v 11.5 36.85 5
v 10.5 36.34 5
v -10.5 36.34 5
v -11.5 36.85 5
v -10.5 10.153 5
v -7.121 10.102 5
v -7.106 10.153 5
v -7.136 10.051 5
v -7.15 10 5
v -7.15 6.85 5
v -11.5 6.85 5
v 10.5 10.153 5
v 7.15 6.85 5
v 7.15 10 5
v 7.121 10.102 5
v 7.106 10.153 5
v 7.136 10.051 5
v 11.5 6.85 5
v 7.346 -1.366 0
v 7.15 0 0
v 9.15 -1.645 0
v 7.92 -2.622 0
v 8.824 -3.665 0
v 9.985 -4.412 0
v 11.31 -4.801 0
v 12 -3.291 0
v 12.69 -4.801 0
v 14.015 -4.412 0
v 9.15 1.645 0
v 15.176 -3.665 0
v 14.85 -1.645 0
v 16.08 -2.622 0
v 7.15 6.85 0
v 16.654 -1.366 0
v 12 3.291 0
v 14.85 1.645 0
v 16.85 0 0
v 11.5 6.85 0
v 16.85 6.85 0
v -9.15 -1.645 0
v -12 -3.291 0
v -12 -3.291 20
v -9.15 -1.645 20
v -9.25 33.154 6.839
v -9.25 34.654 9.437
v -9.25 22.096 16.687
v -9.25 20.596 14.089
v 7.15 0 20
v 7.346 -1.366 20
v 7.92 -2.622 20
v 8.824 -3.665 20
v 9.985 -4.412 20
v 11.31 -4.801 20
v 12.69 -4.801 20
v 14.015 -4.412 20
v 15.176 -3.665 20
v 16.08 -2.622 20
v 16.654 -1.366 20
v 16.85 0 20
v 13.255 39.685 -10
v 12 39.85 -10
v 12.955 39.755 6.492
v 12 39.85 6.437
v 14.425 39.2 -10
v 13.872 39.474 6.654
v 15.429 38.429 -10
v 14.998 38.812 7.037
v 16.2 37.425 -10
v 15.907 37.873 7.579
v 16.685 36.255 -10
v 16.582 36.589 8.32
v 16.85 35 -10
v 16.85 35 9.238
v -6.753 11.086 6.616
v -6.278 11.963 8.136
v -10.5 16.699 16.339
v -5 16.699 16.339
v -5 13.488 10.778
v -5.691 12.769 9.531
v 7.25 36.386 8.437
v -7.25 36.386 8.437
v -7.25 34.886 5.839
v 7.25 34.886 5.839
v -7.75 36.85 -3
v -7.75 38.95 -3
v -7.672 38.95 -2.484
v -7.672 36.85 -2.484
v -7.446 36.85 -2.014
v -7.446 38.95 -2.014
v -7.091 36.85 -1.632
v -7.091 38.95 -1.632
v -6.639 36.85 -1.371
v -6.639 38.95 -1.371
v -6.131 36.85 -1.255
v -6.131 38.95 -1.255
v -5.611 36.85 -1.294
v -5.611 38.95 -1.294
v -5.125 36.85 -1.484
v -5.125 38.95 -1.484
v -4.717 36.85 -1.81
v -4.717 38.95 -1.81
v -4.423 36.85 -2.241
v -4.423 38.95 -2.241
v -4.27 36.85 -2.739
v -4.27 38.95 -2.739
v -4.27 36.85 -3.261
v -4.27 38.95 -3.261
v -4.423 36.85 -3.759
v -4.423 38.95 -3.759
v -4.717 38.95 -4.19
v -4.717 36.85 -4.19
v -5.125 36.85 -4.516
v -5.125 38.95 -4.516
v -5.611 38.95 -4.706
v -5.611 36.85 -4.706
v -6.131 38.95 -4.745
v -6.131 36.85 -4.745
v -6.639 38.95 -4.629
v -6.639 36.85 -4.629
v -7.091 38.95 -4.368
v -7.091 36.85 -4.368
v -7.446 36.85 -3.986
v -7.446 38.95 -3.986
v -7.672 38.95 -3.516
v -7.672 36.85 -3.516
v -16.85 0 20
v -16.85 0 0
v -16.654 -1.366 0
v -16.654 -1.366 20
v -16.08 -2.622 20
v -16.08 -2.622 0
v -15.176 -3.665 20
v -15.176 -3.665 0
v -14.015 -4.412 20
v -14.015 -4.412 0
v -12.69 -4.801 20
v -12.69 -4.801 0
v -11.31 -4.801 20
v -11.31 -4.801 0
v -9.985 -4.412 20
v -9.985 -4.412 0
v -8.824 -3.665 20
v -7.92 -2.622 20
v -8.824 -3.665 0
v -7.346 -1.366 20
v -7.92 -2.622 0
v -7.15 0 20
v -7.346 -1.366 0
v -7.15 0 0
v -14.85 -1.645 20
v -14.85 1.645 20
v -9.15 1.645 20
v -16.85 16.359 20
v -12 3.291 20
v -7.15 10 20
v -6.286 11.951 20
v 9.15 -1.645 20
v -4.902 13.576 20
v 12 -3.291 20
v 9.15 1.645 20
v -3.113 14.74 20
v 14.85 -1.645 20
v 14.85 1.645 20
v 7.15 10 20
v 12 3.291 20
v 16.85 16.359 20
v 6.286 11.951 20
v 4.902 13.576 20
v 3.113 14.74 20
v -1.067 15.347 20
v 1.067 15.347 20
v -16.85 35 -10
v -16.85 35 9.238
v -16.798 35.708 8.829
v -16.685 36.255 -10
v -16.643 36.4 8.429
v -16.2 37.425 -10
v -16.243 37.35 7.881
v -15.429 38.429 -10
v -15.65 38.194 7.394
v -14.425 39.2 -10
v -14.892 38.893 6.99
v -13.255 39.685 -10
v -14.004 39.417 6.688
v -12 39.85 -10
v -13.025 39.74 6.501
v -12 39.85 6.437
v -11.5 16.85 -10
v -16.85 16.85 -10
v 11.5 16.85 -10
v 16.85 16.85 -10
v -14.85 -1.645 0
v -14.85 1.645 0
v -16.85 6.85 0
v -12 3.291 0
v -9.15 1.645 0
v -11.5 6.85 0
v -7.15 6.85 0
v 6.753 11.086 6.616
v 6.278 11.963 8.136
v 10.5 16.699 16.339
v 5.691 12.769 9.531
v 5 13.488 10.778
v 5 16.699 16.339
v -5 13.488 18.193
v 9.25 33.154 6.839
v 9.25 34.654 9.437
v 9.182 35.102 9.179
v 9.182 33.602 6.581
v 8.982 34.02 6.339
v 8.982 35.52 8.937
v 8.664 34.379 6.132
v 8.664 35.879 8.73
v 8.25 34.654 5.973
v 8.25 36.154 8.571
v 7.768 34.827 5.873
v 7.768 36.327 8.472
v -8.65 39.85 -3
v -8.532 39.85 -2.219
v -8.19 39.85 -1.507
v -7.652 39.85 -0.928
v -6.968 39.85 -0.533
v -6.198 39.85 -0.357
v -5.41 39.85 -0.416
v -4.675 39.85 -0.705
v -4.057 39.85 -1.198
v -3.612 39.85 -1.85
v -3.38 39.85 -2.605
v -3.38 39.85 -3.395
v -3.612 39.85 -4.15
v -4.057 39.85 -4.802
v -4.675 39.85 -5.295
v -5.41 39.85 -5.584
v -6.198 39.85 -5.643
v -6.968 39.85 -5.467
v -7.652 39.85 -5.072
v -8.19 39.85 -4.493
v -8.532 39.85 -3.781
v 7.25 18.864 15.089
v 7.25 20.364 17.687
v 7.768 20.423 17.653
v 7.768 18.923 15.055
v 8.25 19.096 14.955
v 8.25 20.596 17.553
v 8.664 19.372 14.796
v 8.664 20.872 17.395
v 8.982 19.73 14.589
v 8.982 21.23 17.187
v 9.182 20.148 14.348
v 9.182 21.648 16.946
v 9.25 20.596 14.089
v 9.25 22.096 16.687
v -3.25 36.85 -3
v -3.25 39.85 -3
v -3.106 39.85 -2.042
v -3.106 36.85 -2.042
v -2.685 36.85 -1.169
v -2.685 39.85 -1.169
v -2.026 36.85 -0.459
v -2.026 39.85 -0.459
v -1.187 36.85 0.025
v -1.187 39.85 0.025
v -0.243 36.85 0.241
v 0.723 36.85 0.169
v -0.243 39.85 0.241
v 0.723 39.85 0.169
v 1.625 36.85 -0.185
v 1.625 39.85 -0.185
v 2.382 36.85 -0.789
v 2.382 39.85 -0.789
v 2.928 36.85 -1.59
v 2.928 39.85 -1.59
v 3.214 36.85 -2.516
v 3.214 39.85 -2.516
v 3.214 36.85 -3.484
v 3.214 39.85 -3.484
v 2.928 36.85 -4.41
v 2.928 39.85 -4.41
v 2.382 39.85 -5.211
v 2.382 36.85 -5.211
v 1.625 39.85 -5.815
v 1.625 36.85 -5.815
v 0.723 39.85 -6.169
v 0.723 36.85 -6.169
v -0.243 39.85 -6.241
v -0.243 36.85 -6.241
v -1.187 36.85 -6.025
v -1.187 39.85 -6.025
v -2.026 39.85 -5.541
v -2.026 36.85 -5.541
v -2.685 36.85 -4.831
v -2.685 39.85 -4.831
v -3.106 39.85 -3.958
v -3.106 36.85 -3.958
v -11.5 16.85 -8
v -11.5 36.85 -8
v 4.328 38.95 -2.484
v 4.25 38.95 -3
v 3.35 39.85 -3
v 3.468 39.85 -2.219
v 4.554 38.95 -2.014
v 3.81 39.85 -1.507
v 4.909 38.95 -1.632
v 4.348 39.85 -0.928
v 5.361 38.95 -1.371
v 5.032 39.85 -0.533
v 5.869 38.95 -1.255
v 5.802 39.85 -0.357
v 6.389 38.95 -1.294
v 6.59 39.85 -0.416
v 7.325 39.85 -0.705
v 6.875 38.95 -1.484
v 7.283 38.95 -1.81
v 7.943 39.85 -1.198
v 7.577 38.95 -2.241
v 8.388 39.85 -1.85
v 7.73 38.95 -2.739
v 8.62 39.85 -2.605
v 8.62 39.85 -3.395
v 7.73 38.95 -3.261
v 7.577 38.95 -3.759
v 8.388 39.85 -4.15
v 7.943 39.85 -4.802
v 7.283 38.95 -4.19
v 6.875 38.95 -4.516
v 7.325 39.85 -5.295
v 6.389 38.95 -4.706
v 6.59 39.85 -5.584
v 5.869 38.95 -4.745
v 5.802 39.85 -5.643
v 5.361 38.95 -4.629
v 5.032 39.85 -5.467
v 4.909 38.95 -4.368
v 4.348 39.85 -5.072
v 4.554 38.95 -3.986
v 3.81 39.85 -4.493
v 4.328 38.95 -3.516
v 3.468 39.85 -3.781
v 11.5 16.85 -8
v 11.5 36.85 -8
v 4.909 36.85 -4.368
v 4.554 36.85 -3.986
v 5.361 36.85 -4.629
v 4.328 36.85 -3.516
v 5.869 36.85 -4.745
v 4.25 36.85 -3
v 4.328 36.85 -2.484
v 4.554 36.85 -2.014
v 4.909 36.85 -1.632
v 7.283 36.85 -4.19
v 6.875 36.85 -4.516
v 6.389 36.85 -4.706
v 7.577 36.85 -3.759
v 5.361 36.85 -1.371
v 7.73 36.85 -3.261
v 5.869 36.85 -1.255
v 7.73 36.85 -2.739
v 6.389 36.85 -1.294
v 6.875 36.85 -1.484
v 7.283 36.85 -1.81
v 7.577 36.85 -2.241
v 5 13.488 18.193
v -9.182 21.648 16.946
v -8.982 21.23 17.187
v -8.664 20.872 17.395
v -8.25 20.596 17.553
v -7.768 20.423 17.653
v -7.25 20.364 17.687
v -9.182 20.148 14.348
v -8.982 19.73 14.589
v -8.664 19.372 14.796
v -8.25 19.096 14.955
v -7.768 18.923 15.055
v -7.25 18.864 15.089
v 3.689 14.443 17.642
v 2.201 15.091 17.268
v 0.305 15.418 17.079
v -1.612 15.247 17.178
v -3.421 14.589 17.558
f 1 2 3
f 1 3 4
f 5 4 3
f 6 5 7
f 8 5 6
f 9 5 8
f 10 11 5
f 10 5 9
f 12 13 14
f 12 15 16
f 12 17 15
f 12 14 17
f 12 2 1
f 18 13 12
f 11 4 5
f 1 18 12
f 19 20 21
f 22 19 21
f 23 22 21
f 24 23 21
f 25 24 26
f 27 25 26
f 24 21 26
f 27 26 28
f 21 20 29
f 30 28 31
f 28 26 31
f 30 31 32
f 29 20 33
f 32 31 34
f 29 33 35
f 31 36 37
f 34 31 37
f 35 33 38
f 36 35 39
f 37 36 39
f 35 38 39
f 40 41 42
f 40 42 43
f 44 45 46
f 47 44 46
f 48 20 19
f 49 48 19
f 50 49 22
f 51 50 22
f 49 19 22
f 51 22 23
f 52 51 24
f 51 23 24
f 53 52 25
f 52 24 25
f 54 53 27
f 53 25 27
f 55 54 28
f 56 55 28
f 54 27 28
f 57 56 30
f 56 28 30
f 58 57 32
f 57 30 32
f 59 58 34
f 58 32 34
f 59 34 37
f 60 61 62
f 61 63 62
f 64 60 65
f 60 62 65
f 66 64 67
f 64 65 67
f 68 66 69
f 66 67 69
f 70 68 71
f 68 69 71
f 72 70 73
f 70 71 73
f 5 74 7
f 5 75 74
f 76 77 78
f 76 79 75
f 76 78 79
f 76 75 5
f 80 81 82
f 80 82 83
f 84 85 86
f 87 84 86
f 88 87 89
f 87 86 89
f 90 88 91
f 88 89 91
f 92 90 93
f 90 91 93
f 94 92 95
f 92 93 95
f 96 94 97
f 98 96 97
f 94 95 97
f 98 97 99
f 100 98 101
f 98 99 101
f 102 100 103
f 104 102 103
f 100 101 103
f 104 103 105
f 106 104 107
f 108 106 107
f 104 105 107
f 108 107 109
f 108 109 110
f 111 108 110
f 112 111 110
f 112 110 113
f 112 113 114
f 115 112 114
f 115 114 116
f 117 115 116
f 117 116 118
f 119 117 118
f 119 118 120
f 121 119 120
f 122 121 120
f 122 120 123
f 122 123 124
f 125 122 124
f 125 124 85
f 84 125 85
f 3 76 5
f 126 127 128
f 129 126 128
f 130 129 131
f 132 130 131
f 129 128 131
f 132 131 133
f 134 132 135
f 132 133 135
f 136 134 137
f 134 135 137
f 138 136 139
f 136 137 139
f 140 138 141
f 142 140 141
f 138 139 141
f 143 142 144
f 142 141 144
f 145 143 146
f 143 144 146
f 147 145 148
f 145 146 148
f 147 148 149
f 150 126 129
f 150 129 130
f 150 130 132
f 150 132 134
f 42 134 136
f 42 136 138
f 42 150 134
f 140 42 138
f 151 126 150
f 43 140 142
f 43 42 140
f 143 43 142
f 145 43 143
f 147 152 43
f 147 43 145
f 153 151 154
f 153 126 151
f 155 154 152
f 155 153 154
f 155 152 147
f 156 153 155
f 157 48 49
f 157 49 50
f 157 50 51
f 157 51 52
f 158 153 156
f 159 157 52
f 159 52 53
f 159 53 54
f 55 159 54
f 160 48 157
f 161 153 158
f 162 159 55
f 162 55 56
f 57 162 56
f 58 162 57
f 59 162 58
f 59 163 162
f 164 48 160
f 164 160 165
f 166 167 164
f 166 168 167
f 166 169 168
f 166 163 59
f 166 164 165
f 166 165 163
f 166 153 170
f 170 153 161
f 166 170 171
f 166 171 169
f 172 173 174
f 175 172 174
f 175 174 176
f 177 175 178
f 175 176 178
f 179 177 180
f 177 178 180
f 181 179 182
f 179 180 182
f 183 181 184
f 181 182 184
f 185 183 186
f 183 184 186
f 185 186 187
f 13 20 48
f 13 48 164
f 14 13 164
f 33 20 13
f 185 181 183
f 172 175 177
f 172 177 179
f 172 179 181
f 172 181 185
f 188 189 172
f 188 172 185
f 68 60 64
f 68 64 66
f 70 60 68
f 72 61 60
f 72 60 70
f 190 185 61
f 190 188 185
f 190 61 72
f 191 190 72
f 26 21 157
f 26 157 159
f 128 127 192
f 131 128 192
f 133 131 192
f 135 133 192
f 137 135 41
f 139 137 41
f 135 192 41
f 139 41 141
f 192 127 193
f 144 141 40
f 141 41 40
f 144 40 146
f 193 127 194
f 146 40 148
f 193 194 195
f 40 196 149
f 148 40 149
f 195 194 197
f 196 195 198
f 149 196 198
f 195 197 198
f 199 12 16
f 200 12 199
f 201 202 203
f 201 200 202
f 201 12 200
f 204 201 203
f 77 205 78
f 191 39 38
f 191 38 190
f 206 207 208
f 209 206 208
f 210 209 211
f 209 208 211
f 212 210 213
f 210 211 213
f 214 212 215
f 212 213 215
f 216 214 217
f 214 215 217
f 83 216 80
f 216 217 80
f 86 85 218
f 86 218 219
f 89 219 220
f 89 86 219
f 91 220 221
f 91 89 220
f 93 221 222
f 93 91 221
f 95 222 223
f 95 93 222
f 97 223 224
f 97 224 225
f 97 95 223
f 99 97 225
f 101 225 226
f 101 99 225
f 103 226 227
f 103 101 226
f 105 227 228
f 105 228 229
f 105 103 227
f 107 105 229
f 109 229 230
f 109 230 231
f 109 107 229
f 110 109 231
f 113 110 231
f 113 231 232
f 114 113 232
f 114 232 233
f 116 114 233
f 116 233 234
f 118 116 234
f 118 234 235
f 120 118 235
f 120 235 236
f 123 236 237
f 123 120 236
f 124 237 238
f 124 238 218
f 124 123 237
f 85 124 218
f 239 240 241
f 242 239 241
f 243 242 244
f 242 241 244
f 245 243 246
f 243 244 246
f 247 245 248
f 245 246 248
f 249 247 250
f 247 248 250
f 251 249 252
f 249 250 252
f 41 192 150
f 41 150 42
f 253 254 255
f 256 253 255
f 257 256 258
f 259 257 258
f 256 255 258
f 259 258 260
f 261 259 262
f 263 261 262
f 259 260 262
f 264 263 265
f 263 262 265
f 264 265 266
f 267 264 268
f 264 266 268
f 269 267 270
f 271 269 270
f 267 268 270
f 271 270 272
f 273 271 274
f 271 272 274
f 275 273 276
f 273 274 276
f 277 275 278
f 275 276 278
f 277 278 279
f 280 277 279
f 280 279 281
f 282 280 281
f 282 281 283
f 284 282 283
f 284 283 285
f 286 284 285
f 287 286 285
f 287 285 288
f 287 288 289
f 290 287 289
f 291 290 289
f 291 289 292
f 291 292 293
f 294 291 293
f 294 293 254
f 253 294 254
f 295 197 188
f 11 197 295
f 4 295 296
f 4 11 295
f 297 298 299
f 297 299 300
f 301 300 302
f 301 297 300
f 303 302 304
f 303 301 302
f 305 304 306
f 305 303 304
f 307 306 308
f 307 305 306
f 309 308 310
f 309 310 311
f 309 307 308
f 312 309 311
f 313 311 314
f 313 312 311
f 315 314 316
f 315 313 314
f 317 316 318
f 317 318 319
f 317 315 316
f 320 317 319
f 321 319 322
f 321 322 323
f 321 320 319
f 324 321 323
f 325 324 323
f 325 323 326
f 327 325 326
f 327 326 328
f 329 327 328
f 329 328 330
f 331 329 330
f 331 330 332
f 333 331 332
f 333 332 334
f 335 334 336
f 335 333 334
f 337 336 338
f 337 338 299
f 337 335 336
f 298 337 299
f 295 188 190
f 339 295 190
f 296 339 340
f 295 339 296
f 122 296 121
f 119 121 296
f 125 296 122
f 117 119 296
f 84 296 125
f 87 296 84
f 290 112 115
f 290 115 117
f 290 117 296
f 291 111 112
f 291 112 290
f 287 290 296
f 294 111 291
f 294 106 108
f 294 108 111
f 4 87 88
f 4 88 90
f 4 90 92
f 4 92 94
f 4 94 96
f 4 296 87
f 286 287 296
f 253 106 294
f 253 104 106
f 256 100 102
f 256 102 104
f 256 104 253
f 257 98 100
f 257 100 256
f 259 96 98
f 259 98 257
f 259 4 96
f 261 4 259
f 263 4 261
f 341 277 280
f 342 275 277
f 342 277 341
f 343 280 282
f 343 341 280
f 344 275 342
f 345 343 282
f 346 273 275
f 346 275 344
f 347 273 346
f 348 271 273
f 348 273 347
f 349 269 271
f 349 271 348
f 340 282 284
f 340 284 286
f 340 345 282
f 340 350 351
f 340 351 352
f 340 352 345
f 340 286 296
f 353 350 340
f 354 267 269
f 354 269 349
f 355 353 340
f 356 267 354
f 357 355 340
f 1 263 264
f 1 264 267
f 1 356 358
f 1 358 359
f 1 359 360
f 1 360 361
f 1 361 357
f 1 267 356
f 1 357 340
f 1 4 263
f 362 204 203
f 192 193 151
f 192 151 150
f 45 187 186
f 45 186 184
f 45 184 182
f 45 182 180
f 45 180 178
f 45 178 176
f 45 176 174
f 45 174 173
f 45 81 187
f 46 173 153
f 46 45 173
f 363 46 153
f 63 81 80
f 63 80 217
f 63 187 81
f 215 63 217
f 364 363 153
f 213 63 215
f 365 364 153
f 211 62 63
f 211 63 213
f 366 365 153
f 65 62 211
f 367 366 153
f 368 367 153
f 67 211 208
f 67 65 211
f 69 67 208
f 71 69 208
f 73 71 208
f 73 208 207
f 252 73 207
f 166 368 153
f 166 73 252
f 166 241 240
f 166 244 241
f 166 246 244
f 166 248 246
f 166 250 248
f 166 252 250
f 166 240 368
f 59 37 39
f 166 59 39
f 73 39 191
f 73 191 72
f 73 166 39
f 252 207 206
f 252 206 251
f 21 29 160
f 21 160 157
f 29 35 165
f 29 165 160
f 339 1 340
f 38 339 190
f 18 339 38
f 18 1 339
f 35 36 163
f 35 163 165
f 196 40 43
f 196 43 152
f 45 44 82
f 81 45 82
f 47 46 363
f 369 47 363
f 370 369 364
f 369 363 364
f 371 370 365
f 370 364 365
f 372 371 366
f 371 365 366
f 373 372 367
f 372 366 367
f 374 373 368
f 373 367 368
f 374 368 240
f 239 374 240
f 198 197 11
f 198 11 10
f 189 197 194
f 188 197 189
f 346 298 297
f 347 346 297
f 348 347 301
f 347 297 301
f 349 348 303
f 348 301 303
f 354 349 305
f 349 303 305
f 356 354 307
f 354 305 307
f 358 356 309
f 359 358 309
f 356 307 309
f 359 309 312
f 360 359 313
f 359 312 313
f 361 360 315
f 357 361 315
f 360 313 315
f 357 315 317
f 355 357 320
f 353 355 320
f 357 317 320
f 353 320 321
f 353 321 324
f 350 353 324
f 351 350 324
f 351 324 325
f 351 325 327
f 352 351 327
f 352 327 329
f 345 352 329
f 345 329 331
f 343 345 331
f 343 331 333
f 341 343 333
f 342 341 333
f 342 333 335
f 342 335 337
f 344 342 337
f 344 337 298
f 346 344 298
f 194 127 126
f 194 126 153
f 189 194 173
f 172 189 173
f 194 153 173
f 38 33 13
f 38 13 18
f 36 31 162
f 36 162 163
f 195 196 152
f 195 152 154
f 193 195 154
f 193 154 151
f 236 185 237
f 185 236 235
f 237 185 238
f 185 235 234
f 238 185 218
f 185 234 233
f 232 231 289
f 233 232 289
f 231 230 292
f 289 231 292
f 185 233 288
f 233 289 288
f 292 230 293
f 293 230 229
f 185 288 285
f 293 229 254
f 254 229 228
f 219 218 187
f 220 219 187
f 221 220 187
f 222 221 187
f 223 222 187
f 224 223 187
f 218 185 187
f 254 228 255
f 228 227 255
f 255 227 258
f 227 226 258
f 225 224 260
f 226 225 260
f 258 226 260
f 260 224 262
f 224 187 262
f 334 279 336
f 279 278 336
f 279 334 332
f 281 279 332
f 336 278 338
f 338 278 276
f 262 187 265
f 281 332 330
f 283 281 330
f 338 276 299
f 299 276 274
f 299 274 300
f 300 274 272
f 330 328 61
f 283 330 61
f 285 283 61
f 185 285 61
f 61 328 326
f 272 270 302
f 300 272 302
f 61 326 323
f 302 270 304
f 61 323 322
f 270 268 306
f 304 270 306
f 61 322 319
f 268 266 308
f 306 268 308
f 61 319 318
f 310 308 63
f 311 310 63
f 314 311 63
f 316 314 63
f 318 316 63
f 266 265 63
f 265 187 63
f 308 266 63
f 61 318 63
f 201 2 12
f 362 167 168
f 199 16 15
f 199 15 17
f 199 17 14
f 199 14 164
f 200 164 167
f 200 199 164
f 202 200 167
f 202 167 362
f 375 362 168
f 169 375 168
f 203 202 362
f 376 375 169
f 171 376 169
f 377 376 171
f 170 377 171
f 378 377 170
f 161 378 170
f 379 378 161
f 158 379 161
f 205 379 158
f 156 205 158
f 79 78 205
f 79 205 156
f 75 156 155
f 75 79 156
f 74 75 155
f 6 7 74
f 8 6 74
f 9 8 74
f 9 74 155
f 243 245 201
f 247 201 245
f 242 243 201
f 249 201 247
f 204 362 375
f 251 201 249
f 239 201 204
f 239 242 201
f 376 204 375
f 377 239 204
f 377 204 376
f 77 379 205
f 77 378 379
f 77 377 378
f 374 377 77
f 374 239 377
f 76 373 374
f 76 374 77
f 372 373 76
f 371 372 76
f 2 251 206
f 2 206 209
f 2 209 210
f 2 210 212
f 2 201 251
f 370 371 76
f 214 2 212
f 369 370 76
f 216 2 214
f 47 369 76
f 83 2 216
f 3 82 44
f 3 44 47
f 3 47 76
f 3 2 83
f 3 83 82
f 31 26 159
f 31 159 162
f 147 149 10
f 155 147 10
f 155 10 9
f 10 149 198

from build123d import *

# Parameters (mm, degrees)
PAD_DEPTH       = 20
POCKET_DEPTH    = 35
POCKET001_DEPTH = 25
POCKET002_DEPTH = 30
SKETCH004_W     = 23
SKETCH004_H     = 30
POCKET003_DEPTH = 5
PAD001_DEPTH    = 10
POCKET004_DEPTH = 35
SKETCH007_R     = 3.25
SKETCH007_R_2   = 1.75
POCKET005_DEPTH = 5
CHAMFER_SIZE    = 0.9
PAD002_DEPTH    = 2


with BuildPart() as part:
    # Sketch → Pad (new body)
    with BuildSketch(Plane.XY):
        with BuildLine():
            ThreePointArc((-16.85, 0), (-12, -4.85), (-7.15, 0))
            Line((-7.15, 0), (-7.15, 10))
            ThreePointArc((7.15, 10), (0, 15.4244528418), (-7.15, 10))
            Line((7.15, 0), (7.15, 10))
            ThreePointArc((7.15, 0), (12, -4.85), (16.85, 0))
            Line((16.85, 0), (16.85, 35))
            ThreePointArc((16.85, 35), (15.4294678888, 38.4294678888), (12, 39.85))
            Line((-12, 39.85), (12, 39.85))
            ThreePointArc((-12, 39.85), (-15.4294678888, 38.4294678888), (-16.85, 35))
            Line((-16.85, 0), (-16.85, 35))
        make_face()
        Polygon((-9.15, -1.6454482672), (-9.15, 1.6454482672), (-12, 3.2908965344), (-14.85, 1.6454482672), (-14.85, -1.6454482672), (-12, -3.2908965344), align=None, mode=Mode.SUBTRACT)
        Polygon((14.85, -1.6454482672), (14.85, 1.6454482672), (12, 3.2908965344), (9.15, 1.6454482672), (9.15, -1.6454482672), (12, -3.2908965344), align=None, mode=Mode.SUBTRACT)
    extrude(amount=PAD_DEPTH)

    # Sketch001 (on Face8 of Pad) → Pocket (cut)
    with BuildSketch(Plane.YZ.offset(16.85)):
        Polygon((7.6987298108, 25), (51, 25), (51, 0), align=None)
    extrude(amount=-POCKET_DEPTH, mode=Mode.SUBTRACT)

    # Sketch002 (on Face4 of Pocket) → Pocket001 (cut)
    with BuildSketch(Plane(origin=(0, 12.75, 22.0836477965), x_dir=(1, 0, 0), z_dir=(0, 0.5, 0.8660254038))):
        with BuildLine():
            Line((-7.25, 27.2923845901), (7.25, 27.2923845901))
            ThreePointArc((9.25, 25.2923845901), (8.6642135624, 26.7065981525), (7.25, 27.2923845901))
            Line((9.25, 25.2923845901), (9.25, 10.7923845901))
            ThreePointArc((7.25, 8.7923845901), (8.6642135624, 9.3781710277), (9.25, 10.7923845901))
            Line((-7.25, 8.7923845901), (7.25, 8.7923845901))
            ThreePointArc((-9.25, 10.7923845901), (-8.6642135624, 9.3781710277), (-7.25, 8.7923845901))
            Line((-9.25, 25.2923845901), (-9.25, 10.7923845901))
            Line((-9.25, 25.2923845901), (-7.25, 27.2923845901))
        make_face()
    extrude(amount=-POCKET001_DEPTH, mode=Mode.SUBTRACT)

    # Sketch003 (on DatumPlane) → Pocket002 (cut)
    with BuildSketch(Plane(origin=(0, 12.1160254038, 18.9855715851), x_dir=(1, 0, 0), z_dir=(0, 0.5, 0.8660254038))):
        Polygon((-10.5, 28.2923845901), (10.5, 28.2923845901), (10.5, 5.2923845901), (5, 5.2923845901), (5, -0.7076154099), (-5, -0.7076154099), (-5, 5.2923845901), (-10.5, 5.2923845901), align=None)
    extrude(amount=-POCKET002_DEPTH, mode=Mode.SUBTRACT)

    # Sketch004 (on Face2 of Pocket002) → Pocket003 (cut)
    with BuildSketch(Plane(origin=(0, 0, 0), x_dir=(1, 0, 0), z_dir=(0, 0, -1))):
        with Locations((0, -21.85)):
            Rectangle(SKETCH004_W, SKETCH004_H)
    extrude(amount=-POCKET003_DEPTH, mode=Mode.SUBTRACT)

    # Sketch005 (on Face2 of Pocket003) → Pad001 (join)
    with BuildSketch(Plane(origin=(0, 0, 0), x_dir=(1, 0, 0), z_dir=(0, 0, -1))):
        with BuildLine():
            Line((-11.5, -6.85), (-16.85, -6.85))
            Line((-16.85, -6.85), (-16.85, -35))
            ThreePointArc((-16.85, -35), (-15.4294678888, -38.4294678888), (-12, -39.85))
            Line((-12, -39.85), (12, -39.85))
            ThreePointArc((12, -39.85), (15.4294678888, -38.4294678888), (16.85, -35))
            Line((16.85, -6.85), (16.85, -35))
            Line((11.5, -6.85), (16.85, -6.85))
            Line((11.5, -36.85), (11.5, -6.85))
            Line((-11.5, -36.85), (11.5, -36.85))
            Line((-11.5, -6.85), (-11.5, -36.85))
        make_face()
    extrude(amount=PAD001_DEPTH)

    # Sketch006 (on Face25 of Pad001) → Pocket004 (cut)
    with BuildSketch(Plane.YZ.offset(16.85)):
        Polygon((6.85, 0), (16.85, -10), (6.85, -10), align=None)
    extrude(amount=-POCKET004_DEPTH, mode=Mode.SUBTRACT)

    # Sketch007 (on Face7 of Pocket004) → Pocket005 (cut)
    with BuildSketch(Plane(origin=(0, 39.85, 0), x_dir=(-1, 0, 0), z_dir=(0, 1, 0))):
        with Locations((0, -3)):
            Circle(SKETCH007_R)
        with Locations((6, -3)):
            Circle(SKETCH007_R_2)
        with Locations((-6, -3)):
            Circle(SKETCH007_R_2)
    extrude(amount=-POCKET005_DEPTH, mode=Mode.SUBTRACT)

    # Chamfer
    chamfer_edges = [part.edges().sort_by_distance(p)[0] for p in [
        (7.75, 39.85, -3),
        (-4.25, 39.85, -3),
    ]]
    chamfer(chamfer_edges, length=CHAMFER_SIZE)

    # Sketch008 (on Face8 of Pocket005) → Pad002 (join)
    with BuildSketch(Plane(origin=(0, 0, -10), x_dir=(1, 0, 0), z_dir=(0, 0, -1))):
        with BuildLine():
            Line((-16.85, -16.85), (16.85, -16.85))
            Line((16.85, -16.85), (16.85, -35))
            ThreePointArc((12, -39.85), (15.4294678888, -38.4294678888), (16.85, -35))
            Line((12, -39.85), (-12, -39.85))
            ThreePointArc((-16.85, -35), (-15.4294678888, -38.4294678888), (-12, -39.85))
            Line((-16.85, -16.85), (-16.85, -35))
        make_face()
    extrude(amount=-PAD002_DEPTH)


solid = part.part
